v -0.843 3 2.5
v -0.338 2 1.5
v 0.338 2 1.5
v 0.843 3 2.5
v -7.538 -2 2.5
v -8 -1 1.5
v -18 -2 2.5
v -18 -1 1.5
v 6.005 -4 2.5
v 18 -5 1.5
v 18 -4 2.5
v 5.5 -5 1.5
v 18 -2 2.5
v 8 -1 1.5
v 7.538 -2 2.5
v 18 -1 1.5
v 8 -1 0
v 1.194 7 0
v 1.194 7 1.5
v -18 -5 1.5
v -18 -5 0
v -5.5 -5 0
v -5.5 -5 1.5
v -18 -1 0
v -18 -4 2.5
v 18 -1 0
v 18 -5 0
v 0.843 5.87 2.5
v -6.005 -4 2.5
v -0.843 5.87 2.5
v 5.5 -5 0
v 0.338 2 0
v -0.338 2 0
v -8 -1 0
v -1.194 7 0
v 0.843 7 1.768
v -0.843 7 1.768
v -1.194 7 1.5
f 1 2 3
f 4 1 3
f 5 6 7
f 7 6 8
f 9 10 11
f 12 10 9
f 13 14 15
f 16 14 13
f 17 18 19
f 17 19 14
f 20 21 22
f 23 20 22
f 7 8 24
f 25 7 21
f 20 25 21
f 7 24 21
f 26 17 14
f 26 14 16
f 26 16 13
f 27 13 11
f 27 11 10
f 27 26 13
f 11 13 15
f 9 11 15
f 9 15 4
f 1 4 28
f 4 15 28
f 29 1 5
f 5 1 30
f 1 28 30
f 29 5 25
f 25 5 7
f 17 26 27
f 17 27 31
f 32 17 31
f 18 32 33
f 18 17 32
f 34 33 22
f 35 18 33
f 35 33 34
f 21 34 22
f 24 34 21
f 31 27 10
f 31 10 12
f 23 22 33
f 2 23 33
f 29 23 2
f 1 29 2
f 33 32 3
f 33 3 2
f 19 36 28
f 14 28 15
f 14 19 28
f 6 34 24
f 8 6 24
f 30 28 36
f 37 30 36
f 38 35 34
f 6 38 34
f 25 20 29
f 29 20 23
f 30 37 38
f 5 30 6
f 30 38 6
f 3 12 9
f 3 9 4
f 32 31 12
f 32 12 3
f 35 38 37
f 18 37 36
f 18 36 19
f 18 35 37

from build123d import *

# Parameters (mm, degrees)
F2_DEPTH = 2.5
F4_SIZE  = 1
F5_SIZE  = 1


with BuildPart() as f2:
    # F1 (on face) → F2 (new body)
    with BuildSketch(Plane.XY):
        Polygon((-8, -1), (-18, -1), (-18, -5), (-5.5, -5), (-0.3375368448, 2), (0, 2), (0, 7), (-1.1940948898, 7), align=None)
    extrude(amount=F2_DEPTH)

    # F3: F2 across plane


with BuildPart() as f2_1:
    add(f2.part)
    add(f2.part.mirror(Plane.YZ))

    # F4 (call 1 of 3: OpenCascade refuses the feature's edges together)
    f4_edges = [f2_1.edges().sort_by_distance(p)[0] for p in [
        (-11.75, -5, 2.5),
        (-2.918768, -1.5, 2.5),
        (2.918768, -1.5, 2.5),
        (11.75, -5, 2.5),
        (0, 2, 2.5),
    ]]
    chamfer(f4_edges, length=F4_SIZE)

    # F4#2 (call 2 of 3)
    f4_2_edges = [f2_1.edges().sort_by_distance(p)[0] for p in [
        (-13, -1, 2.5),
        (-4.597047, 3, 2.5),
    ]]
    chamfer(f4_2_edges, length=F4_SIZE)

    # F4#3 (call 3 of 3)
    f4_3_edges = [f2_1.edges().sort_by_distance(p)[0] for p in [
        (4.597047, 3, 2.5),
        (13, -1, 2.5),
    ]]
    chamfer(f4_3_edges, length=F4_SIZE)

    # F5
    f5_edges = [f2_1.edges().sort_by_distance(p)[0] for p in [
        (0, 6.930164, 2.454748),
    ]]
    chamfer(f5_edges, length=F5_SIZE)


solid = f2_1.part
